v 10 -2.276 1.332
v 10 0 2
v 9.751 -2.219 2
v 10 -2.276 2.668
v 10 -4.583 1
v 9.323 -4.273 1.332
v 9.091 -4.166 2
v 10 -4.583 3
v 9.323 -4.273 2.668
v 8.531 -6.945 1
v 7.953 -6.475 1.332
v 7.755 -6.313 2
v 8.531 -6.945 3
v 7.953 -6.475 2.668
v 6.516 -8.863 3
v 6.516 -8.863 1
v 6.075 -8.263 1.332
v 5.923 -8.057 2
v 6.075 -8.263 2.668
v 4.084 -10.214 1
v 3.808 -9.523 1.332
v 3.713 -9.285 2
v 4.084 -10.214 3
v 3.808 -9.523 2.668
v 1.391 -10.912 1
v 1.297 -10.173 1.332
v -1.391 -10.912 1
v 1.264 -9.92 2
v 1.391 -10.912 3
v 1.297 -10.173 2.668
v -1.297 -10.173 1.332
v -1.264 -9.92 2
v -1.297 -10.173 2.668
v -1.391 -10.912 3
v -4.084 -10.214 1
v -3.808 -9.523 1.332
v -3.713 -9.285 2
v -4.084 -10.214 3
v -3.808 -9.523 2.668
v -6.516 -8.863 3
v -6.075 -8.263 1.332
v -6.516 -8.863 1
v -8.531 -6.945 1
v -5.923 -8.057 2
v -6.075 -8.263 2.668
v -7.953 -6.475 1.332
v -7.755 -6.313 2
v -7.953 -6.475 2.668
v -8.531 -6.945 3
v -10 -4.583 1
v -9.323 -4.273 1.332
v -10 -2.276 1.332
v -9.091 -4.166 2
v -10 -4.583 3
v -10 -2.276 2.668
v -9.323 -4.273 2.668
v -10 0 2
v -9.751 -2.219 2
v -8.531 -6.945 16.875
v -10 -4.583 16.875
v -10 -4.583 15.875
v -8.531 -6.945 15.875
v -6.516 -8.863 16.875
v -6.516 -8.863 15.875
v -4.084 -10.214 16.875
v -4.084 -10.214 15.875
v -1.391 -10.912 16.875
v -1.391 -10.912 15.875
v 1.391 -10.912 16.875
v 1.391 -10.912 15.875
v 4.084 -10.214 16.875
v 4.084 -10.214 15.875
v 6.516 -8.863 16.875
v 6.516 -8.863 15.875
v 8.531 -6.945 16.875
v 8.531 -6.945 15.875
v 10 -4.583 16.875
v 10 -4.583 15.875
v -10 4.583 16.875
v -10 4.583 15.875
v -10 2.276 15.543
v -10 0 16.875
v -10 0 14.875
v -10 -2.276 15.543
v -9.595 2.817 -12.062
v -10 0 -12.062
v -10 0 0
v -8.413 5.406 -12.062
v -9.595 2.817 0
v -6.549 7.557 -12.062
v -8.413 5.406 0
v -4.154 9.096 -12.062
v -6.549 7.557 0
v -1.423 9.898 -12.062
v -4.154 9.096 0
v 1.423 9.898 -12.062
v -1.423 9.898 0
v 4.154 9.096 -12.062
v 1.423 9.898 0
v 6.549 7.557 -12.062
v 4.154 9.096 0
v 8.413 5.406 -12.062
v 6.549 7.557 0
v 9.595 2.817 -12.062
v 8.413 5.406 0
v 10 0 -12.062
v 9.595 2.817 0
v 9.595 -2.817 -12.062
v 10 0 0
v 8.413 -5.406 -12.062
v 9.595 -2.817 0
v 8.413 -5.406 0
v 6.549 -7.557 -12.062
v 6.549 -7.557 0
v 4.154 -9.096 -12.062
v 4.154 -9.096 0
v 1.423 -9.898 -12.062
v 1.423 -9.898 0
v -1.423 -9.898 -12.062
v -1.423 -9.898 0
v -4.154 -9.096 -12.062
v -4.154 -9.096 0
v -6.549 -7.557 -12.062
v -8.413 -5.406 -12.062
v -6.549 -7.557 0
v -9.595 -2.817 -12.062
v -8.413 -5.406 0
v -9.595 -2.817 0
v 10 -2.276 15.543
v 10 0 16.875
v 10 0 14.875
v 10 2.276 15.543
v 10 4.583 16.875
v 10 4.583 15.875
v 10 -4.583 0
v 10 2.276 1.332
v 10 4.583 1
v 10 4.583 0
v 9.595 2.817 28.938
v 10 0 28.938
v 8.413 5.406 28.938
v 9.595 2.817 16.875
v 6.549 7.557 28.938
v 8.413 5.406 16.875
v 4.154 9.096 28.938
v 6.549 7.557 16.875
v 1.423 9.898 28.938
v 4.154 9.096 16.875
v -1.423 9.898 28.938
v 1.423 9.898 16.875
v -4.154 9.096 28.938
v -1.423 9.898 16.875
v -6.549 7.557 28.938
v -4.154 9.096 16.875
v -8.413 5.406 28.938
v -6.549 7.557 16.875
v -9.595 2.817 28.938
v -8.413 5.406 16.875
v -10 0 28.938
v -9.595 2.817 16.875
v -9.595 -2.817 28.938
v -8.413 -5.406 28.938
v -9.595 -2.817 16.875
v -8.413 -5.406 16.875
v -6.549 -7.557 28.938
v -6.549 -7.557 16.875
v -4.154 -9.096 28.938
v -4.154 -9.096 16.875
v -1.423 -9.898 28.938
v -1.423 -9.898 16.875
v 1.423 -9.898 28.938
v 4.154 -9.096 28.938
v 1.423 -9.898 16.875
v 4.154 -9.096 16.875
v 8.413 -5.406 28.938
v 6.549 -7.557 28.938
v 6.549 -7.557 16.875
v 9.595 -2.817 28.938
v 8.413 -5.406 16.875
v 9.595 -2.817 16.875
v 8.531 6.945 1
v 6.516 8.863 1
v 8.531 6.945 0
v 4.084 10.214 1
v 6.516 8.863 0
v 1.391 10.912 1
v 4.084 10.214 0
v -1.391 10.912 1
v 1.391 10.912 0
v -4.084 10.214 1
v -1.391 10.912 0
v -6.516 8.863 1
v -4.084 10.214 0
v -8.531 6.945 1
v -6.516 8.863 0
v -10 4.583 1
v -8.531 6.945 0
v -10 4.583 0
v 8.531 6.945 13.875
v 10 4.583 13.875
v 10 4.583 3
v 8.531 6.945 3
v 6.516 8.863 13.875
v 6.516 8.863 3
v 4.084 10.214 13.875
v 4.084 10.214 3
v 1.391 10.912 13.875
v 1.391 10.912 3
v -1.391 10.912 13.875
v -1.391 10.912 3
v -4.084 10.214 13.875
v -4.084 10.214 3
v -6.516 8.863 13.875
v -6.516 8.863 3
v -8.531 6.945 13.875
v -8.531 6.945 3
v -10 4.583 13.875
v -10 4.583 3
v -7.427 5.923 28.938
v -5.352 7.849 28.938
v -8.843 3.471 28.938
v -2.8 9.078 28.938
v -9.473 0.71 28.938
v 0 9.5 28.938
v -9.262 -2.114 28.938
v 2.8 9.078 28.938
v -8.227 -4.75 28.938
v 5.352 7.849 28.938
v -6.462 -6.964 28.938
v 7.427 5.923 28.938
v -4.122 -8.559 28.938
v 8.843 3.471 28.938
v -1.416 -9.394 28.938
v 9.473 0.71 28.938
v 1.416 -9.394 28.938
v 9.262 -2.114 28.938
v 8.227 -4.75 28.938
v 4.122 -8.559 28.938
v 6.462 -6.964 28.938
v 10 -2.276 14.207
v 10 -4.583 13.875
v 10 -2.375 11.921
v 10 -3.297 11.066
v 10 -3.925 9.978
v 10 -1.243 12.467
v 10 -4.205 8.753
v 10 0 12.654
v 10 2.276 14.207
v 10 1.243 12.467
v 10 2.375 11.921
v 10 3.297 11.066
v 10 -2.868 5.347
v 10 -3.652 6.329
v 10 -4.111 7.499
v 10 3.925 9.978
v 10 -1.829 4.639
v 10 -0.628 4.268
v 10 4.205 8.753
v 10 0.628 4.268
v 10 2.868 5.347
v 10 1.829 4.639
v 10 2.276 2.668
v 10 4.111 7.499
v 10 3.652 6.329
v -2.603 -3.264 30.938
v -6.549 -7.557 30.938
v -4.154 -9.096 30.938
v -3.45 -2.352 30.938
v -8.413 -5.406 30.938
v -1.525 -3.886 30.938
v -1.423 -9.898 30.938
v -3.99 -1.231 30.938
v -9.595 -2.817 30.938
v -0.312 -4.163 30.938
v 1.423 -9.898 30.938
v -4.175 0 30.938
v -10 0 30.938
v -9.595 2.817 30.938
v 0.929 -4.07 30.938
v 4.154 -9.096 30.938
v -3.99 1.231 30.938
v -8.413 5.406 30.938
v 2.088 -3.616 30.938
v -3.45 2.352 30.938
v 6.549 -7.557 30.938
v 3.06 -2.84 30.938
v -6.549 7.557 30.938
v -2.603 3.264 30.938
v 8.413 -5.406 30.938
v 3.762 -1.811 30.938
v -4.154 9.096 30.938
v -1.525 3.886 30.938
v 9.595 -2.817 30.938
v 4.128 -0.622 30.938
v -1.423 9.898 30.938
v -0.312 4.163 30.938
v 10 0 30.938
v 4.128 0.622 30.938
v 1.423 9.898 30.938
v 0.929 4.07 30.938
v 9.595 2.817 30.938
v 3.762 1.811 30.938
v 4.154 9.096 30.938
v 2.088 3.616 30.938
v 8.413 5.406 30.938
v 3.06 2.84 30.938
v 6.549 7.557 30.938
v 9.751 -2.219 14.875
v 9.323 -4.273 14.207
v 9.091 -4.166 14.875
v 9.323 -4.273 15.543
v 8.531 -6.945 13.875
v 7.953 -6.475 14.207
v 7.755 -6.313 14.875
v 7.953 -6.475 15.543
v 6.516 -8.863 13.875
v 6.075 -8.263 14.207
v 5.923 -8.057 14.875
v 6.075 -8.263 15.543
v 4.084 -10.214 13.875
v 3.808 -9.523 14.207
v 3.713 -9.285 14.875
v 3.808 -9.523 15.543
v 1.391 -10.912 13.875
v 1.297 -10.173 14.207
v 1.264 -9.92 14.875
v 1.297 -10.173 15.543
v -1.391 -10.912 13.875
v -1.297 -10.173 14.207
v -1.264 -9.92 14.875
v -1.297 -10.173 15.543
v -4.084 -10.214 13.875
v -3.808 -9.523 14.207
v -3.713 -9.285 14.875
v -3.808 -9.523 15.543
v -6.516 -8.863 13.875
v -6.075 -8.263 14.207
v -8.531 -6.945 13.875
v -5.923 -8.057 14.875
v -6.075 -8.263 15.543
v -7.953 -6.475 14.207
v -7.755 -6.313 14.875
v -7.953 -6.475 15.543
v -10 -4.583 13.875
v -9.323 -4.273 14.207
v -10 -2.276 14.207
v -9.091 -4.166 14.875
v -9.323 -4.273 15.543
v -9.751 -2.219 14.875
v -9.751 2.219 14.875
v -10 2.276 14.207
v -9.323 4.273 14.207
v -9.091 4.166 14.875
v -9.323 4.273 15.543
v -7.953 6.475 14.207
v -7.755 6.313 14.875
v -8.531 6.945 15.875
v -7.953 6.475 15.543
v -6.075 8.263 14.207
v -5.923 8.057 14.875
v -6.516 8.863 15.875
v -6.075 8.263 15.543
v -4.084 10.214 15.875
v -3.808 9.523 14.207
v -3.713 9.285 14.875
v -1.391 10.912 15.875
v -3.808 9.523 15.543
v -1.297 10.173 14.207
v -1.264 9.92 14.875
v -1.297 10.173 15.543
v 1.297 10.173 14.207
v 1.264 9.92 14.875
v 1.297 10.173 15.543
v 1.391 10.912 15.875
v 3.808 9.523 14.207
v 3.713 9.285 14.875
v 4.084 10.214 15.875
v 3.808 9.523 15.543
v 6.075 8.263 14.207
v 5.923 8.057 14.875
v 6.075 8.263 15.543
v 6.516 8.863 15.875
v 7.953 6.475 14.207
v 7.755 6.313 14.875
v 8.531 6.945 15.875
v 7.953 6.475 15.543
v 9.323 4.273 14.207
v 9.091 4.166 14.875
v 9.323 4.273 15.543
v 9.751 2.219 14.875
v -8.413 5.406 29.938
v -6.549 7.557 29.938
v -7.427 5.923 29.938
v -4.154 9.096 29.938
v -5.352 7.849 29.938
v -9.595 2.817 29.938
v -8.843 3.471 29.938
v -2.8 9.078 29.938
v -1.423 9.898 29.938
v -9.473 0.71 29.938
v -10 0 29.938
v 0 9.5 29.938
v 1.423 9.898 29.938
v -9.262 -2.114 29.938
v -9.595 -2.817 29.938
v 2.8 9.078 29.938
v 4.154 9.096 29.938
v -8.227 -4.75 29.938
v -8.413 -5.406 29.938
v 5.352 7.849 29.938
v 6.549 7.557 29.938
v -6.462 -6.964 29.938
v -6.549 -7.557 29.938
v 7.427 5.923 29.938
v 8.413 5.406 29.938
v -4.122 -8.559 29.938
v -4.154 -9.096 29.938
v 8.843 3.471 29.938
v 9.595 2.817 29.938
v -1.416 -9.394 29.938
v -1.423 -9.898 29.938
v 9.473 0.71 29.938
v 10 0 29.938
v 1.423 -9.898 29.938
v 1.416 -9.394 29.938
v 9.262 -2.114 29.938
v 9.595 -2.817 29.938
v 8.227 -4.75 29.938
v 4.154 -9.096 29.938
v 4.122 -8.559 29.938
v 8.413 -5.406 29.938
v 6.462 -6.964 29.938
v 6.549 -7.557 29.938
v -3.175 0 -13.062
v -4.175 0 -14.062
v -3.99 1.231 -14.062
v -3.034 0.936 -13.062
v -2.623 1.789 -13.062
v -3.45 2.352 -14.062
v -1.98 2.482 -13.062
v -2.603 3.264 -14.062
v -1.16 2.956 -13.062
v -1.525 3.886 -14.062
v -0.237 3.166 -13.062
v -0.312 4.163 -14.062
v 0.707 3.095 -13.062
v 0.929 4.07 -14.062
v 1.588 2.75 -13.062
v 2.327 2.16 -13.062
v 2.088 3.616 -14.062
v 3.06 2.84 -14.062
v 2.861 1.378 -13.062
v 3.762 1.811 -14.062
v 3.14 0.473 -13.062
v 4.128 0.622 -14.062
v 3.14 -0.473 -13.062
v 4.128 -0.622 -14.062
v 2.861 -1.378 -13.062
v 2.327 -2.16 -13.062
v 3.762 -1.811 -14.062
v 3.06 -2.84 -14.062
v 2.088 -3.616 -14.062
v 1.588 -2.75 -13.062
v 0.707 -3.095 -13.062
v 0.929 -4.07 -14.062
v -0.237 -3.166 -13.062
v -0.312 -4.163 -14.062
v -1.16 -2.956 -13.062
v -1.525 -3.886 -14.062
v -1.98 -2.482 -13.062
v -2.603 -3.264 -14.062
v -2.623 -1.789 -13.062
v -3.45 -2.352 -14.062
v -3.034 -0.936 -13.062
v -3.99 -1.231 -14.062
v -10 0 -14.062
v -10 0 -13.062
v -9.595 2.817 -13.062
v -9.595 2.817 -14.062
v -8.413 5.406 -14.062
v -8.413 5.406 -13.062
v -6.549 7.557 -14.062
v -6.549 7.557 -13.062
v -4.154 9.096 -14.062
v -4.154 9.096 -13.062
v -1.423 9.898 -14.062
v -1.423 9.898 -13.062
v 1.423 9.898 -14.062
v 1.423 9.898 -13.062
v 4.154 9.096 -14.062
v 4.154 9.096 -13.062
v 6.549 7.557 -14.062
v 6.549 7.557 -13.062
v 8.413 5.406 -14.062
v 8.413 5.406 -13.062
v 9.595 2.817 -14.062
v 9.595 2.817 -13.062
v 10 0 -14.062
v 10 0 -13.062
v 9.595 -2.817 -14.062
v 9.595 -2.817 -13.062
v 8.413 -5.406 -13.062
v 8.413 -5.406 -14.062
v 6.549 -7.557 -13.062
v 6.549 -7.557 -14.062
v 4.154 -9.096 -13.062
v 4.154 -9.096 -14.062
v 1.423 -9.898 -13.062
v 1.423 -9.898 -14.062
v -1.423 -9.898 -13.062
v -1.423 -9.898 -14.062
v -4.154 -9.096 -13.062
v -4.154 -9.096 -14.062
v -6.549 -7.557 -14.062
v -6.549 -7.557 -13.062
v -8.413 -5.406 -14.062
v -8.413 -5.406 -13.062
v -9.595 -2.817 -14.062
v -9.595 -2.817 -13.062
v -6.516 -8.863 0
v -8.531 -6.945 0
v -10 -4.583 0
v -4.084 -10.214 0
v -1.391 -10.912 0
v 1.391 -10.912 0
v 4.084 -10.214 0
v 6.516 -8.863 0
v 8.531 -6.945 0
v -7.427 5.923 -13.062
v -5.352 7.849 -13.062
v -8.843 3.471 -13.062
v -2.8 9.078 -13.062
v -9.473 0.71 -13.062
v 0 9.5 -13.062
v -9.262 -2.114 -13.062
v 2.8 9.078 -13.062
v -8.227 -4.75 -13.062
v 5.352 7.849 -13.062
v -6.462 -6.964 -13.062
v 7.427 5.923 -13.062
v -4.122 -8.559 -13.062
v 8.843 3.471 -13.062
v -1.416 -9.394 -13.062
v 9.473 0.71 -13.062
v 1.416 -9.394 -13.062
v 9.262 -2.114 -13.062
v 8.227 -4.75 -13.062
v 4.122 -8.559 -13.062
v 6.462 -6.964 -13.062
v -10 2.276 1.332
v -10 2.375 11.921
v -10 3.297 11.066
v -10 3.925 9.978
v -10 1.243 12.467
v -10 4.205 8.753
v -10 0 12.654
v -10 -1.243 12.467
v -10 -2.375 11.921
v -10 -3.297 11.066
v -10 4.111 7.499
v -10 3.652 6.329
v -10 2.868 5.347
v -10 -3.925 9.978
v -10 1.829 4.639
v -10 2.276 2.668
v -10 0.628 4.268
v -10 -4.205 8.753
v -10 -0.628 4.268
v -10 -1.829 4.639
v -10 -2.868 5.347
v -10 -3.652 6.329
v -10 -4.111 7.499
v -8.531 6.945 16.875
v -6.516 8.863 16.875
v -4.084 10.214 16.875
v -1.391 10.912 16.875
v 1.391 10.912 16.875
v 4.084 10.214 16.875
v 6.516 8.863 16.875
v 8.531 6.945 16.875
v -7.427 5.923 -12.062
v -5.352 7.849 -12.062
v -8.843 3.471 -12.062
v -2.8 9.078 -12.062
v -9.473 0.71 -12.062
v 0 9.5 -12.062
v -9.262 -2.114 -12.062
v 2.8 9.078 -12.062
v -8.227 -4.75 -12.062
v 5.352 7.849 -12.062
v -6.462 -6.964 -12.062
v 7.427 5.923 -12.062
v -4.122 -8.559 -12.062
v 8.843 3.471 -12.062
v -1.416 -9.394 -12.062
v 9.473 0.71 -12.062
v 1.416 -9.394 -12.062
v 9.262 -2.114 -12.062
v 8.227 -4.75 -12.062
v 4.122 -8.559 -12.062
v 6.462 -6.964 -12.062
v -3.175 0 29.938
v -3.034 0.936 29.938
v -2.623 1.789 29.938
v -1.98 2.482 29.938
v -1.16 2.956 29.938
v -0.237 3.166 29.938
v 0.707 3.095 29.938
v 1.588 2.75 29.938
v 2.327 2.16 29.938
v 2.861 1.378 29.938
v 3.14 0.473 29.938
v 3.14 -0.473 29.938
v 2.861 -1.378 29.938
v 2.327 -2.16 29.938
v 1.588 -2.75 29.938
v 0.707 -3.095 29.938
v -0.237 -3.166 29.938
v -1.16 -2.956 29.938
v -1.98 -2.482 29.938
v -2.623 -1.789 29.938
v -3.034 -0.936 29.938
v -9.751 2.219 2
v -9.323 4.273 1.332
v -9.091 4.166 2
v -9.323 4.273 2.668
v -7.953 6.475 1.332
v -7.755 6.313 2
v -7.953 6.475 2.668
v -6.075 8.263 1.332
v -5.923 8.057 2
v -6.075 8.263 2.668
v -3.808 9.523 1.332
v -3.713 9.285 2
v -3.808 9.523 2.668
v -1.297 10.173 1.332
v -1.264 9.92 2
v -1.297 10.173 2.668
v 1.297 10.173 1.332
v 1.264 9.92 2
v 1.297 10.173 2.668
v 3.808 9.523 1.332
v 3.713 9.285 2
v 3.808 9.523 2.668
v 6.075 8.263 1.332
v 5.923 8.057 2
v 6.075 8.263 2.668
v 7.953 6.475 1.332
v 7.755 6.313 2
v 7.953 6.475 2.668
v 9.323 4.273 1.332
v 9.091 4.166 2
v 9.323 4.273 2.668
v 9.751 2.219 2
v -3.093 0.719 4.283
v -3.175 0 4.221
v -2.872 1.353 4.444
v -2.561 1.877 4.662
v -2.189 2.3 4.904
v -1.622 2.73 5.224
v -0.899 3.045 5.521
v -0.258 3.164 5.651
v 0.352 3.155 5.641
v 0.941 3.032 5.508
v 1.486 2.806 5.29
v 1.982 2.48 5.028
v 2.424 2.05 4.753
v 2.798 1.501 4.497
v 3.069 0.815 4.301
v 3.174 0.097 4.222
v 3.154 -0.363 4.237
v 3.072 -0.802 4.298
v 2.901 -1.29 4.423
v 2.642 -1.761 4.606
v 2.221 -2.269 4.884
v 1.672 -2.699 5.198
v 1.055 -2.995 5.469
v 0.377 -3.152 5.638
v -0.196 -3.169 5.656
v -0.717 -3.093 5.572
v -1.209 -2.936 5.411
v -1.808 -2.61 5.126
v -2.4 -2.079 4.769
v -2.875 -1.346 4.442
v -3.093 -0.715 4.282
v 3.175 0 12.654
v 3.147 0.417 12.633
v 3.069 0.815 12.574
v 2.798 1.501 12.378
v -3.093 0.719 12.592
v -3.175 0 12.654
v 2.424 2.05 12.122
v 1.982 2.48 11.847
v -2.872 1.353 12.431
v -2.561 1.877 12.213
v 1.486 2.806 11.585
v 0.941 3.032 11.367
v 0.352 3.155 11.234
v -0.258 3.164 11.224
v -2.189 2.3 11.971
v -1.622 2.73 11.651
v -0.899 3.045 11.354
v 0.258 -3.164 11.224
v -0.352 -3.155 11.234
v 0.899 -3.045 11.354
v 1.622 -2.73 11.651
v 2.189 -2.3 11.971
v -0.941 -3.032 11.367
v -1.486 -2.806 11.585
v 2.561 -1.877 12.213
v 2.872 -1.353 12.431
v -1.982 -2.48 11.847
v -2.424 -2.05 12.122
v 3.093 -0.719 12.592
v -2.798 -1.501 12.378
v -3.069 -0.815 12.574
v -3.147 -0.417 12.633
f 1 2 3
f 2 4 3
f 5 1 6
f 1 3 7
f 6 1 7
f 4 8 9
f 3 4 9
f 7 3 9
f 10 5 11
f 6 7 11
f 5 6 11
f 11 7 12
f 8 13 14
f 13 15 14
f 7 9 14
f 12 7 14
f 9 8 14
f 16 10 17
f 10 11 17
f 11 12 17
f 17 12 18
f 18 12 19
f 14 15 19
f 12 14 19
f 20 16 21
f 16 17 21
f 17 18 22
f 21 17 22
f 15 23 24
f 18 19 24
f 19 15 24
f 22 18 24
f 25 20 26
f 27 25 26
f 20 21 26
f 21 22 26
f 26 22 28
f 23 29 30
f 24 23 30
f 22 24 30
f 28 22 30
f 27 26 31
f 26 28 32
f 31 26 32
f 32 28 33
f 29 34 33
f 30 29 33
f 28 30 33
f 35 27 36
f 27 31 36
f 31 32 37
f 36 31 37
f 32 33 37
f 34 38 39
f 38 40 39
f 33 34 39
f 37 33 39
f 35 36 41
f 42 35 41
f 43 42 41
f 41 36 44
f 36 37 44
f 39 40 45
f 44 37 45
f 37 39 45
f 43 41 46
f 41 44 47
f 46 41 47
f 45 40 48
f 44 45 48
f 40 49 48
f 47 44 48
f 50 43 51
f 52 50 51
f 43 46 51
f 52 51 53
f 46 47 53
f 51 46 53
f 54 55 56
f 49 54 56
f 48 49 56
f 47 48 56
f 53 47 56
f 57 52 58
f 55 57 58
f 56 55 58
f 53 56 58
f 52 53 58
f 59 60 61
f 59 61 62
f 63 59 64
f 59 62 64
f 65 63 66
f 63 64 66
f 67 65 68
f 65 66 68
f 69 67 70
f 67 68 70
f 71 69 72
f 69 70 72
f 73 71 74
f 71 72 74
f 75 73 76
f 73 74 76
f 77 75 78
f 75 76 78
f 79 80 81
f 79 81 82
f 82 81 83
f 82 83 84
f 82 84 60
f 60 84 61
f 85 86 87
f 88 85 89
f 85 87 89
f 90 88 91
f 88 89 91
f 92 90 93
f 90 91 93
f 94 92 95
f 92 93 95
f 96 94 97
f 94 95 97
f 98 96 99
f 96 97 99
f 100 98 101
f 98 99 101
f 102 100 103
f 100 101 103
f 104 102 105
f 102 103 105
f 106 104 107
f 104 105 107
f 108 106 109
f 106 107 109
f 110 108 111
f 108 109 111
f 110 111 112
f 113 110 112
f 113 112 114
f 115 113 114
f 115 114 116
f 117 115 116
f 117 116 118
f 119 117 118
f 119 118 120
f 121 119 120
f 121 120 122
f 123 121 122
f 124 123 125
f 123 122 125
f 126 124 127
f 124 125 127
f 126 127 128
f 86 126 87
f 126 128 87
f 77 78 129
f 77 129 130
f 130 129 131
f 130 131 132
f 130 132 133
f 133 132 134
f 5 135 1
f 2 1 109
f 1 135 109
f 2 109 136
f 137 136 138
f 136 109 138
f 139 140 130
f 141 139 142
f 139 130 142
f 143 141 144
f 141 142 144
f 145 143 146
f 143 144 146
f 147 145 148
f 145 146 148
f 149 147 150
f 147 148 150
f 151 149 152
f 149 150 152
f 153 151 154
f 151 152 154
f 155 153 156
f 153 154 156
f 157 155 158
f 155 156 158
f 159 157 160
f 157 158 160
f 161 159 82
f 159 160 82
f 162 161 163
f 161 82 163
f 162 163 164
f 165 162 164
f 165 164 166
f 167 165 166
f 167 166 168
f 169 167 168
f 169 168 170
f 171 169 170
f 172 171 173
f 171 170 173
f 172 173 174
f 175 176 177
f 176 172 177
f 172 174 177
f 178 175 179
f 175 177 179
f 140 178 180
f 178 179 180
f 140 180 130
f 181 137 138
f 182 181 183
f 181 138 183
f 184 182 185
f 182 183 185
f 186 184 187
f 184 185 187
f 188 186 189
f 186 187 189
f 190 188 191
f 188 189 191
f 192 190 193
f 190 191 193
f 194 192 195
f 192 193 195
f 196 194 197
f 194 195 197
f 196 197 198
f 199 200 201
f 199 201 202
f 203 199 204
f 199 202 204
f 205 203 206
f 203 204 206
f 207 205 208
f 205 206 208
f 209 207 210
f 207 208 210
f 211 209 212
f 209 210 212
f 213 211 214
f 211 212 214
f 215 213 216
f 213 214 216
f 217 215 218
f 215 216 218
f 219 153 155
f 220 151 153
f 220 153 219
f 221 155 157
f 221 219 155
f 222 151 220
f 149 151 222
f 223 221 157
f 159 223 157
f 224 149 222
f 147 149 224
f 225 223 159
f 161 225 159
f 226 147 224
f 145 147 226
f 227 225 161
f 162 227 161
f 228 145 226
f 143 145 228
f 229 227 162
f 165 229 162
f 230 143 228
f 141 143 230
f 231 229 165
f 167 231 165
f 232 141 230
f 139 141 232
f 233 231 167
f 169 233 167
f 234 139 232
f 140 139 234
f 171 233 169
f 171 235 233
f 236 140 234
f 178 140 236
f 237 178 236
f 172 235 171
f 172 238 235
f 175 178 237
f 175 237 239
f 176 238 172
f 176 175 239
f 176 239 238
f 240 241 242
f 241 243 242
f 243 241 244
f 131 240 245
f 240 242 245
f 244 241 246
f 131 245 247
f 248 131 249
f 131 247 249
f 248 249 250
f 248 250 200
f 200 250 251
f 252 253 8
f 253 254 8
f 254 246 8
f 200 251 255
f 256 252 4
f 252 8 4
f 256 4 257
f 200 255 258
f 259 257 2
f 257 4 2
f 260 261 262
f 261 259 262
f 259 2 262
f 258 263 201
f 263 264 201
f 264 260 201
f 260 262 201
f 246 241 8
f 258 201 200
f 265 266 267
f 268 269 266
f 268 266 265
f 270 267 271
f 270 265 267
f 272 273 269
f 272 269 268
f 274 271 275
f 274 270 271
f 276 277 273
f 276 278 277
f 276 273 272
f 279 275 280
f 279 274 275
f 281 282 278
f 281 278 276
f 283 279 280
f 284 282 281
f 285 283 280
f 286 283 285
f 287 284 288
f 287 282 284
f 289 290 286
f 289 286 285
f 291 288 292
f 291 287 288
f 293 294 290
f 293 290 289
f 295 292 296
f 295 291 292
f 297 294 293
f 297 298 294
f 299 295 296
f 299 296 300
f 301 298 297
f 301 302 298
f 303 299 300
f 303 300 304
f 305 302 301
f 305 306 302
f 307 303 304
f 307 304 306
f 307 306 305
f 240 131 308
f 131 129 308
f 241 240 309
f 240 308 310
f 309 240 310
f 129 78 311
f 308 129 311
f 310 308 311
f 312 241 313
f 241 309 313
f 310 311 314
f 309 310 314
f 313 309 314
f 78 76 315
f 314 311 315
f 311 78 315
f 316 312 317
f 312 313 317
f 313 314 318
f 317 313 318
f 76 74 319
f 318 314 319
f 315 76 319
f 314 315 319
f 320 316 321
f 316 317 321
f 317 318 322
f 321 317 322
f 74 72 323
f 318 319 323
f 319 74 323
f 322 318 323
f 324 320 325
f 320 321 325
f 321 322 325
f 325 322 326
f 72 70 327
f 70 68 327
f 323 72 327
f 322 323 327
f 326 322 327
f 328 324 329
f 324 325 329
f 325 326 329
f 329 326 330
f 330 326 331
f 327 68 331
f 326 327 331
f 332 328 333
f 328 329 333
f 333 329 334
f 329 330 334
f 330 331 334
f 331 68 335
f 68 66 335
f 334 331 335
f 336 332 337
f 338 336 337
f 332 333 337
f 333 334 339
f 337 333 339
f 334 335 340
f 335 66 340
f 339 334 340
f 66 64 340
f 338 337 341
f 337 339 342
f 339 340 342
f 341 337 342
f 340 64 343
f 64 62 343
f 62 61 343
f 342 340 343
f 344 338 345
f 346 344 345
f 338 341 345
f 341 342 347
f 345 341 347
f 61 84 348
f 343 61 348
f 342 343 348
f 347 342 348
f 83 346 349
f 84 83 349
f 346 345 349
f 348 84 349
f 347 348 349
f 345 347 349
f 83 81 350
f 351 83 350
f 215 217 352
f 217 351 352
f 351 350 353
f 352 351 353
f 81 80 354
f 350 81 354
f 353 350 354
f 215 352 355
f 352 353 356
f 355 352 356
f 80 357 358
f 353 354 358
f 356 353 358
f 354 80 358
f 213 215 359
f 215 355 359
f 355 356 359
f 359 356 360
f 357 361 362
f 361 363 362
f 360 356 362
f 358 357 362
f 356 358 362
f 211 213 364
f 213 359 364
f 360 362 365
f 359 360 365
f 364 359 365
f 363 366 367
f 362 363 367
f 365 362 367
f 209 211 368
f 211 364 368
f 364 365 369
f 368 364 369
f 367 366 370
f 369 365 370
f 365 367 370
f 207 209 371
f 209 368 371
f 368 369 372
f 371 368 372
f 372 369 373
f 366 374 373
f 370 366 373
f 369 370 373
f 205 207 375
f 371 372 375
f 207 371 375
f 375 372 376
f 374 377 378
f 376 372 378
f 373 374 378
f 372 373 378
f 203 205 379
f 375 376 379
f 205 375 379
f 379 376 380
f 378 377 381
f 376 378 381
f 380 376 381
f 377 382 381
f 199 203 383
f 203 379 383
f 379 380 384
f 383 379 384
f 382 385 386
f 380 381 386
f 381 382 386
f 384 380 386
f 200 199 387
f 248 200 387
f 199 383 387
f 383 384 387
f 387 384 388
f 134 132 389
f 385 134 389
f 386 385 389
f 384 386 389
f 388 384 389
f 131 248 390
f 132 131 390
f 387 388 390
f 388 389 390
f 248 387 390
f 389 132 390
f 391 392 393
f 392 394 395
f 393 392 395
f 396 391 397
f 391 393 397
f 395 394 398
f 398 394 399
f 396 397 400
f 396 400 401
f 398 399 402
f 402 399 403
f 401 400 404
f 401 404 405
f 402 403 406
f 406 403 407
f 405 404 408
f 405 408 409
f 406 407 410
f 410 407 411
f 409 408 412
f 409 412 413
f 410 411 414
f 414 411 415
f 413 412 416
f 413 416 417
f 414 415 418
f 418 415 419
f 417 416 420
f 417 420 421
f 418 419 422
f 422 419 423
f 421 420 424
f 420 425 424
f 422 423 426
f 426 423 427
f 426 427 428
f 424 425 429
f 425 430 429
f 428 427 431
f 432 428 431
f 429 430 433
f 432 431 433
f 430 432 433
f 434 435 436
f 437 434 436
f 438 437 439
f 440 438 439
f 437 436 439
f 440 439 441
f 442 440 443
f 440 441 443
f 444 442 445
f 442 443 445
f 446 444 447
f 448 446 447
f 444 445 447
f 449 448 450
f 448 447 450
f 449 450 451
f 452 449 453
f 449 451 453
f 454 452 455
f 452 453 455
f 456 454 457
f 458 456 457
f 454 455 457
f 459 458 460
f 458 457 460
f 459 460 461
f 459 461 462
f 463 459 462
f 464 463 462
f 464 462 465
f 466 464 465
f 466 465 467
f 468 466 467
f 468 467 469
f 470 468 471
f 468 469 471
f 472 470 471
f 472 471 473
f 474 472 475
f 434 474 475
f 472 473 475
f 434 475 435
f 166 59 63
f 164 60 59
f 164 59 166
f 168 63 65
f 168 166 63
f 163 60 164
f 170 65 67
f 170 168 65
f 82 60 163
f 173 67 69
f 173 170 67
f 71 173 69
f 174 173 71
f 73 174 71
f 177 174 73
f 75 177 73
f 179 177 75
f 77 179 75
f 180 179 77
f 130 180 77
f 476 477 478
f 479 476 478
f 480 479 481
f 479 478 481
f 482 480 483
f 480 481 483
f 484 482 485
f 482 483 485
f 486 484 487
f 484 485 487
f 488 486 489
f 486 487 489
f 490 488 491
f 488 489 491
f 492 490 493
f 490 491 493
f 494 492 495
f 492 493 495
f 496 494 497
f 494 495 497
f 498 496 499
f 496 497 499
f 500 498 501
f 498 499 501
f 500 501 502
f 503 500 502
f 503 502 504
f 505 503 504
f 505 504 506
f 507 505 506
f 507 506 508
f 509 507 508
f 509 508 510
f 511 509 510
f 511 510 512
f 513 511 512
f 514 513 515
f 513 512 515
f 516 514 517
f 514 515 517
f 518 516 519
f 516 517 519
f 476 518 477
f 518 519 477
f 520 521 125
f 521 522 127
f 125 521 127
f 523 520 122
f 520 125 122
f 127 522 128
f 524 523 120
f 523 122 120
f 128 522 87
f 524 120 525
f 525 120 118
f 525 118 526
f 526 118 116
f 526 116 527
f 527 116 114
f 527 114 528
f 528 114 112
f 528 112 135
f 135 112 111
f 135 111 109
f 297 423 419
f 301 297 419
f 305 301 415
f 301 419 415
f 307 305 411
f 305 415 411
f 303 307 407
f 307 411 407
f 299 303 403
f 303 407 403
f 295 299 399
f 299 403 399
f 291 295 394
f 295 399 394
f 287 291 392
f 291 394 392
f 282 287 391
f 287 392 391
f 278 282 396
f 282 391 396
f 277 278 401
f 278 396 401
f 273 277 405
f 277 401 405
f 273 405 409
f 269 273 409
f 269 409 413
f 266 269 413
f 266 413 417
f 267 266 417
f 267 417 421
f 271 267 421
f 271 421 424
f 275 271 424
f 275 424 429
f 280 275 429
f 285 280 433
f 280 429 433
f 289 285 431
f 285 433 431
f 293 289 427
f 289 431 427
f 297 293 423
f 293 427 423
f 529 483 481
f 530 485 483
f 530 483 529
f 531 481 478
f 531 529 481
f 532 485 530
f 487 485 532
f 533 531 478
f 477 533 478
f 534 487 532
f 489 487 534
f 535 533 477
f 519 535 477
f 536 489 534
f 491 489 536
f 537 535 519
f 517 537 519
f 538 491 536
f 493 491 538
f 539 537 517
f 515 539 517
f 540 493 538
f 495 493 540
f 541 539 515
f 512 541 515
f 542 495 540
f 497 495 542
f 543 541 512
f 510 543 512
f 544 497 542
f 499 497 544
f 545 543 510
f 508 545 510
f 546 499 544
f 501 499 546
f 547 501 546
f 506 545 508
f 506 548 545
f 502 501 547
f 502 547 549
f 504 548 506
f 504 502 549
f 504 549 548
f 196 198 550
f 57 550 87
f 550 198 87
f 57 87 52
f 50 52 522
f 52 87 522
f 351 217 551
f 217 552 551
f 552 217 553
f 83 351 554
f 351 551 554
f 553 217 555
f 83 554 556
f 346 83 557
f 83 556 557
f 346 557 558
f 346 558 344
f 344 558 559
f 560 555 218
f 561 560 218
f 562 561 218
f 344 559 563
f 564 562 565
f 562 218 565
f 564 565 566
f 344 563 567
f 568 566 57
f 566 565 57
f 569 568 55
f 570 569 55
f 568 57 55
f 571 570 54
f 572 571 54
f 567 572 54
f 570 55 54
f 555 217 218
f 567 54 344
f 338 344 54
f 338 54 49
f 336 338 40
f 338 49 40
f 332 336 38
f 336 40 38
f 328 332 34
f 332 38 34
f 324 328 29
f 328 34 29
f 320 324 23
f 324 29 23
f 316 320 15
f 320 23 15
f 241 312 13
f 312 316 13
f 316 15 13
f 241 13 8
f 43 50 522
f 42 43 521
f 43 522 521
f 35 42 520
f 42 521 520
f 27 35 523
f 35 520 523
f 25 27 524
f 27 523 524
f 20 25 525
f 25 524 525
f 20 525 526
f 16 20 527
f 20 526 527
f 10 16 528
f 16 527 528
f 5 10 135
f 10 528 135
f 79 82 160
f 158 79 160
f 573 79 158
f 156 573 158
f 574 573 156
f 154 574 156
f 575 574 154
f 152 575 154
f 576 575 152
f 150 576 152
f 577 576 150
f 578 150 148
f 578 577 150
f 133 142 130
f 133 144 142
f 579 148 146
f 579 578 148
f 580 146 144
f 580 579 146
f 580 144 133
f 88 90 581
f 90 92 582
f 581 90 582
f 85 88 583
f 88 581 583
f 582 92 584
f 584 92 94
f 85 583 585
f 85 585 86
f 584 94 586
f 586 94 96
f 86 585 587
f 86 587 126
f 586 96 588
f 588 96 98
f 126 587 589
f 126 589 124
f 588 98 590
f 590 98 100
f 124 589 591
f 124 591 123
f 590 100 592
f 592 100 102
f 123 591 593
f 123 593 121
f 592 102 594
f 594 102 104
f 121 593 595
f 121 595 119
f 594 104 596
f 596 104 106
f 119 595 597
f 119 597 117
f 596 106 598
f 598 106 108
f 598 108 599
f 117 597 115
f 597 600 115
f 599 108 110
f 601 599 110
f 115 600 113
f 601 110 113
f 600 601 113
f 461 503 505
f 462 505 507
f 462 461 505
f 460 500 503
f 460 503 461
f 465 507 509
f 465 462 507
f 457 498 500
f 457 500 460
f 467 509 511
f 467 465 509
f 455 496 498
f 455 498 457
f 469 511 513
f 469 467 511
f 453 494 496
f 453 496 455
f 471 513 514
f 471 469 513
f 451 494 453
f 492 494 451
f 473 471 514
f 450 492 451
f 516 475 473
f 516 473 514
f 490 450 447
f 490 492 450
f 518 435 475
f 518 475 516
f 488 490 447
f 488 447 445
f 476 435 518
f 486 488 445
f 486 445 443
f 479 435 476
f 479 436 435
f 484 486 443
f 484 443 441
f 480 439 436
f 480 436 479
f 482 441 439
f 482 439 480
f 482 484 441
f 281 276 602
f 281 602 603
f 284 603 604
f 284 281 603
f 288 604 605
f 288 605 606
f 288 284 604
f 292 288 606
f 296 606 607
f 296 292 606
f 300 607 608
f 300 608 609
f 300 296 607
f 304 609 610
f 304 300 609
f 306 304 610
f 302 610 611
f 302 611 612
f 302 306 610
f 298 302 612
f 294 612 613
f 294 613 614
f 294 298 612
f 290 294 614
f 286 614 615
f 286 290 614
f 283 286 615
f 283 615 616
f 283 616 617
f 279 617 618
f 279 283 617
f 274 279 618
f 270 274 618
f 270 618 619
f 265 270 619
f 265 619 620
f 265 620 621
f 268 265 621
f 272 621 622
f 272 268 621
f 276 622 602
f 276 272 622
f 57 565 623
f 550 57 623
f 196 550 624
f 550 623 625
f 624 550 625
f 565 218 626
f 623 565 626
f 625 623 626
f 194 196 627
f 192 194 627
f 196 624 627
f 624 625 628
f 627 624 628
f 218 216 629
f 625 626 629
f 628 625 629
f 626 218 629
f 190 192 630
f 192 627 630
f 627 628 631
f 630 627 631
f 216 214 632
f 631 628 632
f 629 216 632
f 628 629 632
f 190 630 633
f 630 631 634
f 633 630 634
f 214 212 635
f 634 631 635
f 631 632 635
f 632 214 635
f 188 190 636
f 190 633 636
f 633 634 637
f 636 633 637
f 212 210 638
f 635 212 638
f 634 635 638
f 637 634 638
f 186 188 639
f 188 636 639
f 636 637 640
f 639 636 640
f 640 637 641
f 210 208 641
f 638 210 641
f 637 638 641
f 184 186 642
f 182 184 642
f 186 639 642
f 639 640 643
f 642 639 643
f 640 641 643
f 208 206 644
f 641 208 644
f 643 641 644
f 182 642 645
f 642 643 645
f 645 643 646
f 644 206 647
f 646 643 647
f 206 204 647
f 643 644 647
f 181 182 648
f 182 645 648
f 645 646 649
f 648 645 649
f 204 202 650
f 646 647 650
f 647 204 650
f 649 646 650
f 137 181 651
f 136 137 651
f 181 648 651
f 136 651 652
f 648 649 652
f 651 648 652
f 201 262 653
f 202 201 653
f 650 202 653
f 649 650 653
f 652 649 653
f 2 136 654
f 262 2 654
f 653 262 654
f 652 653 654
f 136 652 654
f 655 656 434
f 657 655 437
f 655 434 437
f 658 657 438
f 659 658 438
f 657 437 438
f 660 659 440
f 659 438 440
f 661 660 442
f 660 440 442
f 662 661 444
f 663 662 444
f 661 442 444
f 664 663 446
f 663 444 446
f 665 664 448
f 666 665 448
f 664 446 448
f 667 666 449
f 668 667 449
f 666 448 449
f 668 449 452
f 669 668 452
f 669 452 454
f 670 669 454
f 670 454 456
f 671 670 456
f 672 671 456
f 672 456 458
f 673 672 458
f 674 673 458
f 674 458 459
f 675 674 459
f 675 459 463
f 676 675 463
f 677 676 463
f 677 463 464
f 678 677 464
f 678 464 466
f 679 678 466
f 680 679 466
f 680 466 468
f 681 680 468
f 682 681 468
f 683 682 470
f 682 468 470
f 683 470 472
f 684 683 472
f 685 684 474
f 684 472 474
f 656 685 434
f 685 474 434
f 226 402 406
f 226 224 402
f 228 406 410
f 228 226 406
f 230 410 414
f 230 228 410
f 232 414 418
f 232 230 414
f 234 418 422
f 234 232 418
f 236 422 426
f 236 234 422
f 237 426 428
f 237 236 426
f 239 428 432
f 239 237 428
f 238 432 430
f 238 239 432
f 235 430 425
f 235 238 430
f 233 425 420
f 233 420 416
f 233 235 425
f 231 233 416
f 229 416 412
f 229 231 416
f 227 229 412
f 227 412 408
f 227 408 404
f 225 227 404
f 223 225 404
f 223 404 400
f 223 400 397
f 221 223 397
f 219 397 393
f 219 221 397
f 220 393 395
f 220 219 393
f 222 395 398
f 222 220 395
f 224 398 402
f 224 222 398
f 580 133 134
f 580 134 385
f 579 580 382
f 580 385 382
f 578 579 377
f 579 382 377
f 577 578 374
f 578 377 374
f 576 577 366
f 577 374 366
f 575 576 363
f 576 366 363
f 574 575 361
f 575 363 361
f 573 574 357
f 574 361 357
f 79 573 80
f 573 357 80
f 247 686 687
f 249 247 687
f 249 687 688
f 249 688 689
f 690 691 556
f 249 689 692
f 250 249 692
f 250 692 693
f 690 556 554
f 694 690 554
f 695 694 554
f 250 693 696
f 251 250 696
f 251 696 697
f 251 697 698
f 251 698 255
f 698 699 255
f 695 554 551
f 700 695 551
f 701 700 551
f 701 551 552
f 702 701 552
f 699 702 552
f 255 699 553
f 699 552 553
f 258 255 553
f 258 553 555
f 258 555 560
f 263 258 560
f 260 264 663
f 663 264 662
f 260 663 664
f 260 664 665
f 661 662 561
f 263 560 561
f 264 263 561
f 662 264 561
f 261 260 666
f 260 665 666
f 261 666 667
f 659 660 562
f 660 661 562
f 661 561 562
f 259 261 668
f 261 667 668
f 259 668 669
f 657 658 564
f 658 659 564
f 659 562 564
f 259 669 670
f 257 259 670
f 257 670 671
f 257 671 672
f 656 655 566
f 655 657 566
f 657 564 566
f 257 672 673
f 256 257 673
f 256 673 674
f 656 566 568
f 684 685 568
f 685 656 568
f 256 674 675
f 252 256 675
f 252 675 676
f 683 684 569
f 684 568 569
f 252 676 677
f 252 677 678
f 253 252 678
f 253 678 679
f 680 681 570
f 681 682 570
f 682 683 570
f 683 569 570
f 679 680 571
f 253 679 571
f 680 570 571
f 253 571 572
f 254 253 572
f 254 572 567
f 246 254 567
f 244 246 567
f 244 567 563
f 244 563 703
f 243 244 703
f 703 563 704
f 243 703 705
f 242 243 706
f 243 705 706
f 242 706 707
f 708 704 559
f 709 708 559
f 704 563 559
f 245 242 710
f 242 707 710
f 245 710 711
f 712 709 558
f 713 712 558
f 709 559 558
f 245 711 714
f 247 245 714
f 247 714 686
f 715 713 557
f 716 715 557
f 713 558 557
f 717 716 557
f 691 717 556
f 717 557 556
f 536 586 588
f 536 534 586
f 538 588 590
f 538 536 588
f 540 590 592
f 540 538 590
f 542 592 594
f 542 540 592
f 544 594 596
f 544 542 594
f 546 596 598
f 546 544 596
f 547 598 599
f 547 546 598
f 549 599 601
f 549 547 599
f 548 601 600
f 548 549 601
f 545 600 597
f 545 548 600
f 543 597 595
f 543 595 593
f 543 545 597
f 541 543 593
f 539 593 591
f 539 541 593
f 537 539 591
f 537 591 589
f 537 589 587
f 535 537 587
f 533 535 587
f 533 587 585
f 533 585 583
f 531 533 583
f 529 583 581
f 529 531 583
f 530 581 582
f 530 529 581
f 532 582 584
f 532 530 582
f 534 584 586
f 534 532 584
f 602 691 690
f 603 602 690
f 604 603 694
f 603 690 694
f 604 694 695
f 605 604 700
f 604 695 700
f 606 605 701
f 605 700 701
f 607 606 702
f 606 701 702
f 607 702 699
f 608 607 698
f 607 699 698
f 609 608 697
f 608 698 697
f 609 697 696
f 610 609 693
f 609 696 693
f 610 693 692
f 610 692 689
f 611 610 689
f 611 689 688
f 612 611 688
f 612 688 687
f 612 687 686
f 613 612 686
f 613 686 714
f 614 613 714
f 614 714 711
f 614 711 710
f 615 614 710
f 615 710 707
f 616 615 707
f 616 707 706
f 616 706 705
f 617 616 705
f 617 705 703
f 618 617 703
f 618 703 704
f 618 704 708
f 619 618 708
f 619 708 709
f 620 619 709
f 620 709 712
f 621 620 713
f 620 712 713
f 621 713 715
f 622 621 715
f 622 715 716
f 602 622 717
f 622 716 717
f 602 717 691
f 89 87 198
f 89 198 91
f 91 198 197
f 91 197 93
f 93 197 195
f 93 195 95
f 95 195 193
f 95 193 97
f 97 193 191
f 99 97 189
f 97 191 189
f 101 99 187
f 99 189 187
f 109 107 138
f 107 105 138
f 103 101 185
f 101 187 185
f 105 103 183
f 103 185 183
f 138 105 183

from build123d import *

# Parameters (mm, degrees)
SKETCH1_R               = 11
BOSS_EXTRUDE1_DEPTH     = 16.875
SKETCH2_R               = 10
BOSS_EXTRUDE2_DEPTH     = 14.0625
SKETCH3_R               = 10
BOSS_EXTRUDE3_DEPTH     = 14.0625
CUT_EXTRUDE4_DEPTH      = 15.0625
CUT_EXTRUDE4_DEPTH_BACK = 31.9375
SKETCH6_W               = 1
SKETCH6_H               = 0.5
F_3_8_24_TAPPED_HOLE1_D = 8.4328
SKETCH10_R              = 3.175
CUT_EXTRUDE5_DEPTH      = 1
CUT_EXTRUDE5_DEPTH_BACK = 46
CHAMFER1_SIZE           = 1


with BuildPart() as part:
    # Sketch1 → Boss-Extrude1 (new body)
    with BuildSketch(Plane.XY):
        Circle(SKETCH1_R)
    extrude(amount=BOSS_EXTRUDE1_DEPTH)

    # Sketch2 → Boss-Extrude2 (add)
    with BuildSketch(Plane(origin=(0, 0, 0), x_dir=(-1, 0, 0), z_dir=(0, 0, -1))):
        Circle(SKETCH2_R)
    extrude(amount=BOSS_EXTRUDE2_DEPTH)

    # Sketch3 → Boss-Extrude3 (add)
    with BuildSketch(Plane.XY.offset(16.875)):
        Circle(SKETCH3_R)
    extrude(amount=BOSS_EXTRUDE3_DEPTH)

    # Sketch5 → Cut-Extrude4 (cut, two sides)
    with BuildSketch(Plane(origin=(0, 0, 0), x_dir=(-1, 0, 0), z_dir=(0, 0, -1))) as cut_extrude4_sk:
        with BuildLine():
            Line((-10, -4.582575695), (-10, 4.582575695))
            ThreePointArc((-10, 4.582575695), (-11, 0), (-10, -4.582575695))
        make_face()
        with BuildLine():
            ThreePointArc((11, 0), (10.74709263, 2.34520788), (10, 4.582575695))
            Line((10, 4.582575695), (10, -4.582575695))
            ThreePointArc((10, -4.582575695), (10.74709263, -2.34520788), (11, 0))
        make_face()
    extrude(amount=CUT_EXTRUDE4_DEPTH, mode=Mode.SUBTRACT)
    extrude(cut_extrude4_sk.sketch, amount=-CUT_EXTRUDE4_DEPTH_BACK, mode=Mode.SUBTRACT)

    # Sketch6 → Cut-Revolve1 (revolve, cut)
    with BuildSketch(Plane(origin=(0, 0, 0), x_dir=(0, 0, -1), z_dir=(1, 0, 0))):
        with Locations((12.5625, 9.75)):
            Rectangle(SKETCH6_W, SKETCH6_H)
        with BuildLine():
            Line((-15.875, 11), (-13.875, 11))
            ThreePointArc((-13.875, 11), (-14.875, 10), (-15.875, 11))
        make_face()
        with Locations((-29.4375, 9.75)):
            Rectangle(SKETCH6_W, SKETCH6_H)
        with BuildLine():
            Line((-3, 11), (-1, 11))
            ThreePointArc((-1, 11), (-2, 10), (-3, 11))
        make_face()
    revolve(axis=Axis((0, 0, 30.9375), (0, 0, -1)), mode=Mode.SUBTRACT)

    # 3/8-24 Tapped Hole1 (through all)
    with Locations(Plane(origin=(10, 0, 0), x_dir=(0, 0, -1), z_dir=(1, 0, 0))):
        with Locations((-8.4375, 0)):
            Hole(F_3_8_24_TAPPED_HOLE1_D / 2)

    # Sketch10 → Cut-Extrude5 (cut, two sides)
    with BuildSketch(Plane(origin=(0, 0, -14.0625), x_dir=(-1, 0, 0), z_dir=(0, 0, -1))) as cut_extrude5_sk:
        Circle(SKETCH10_R)
    extrude(amount=CUT_EXTRUDE5_DEPTH, mode=Mode.SUBTRACT)
    extrude(cut_extrude5_sk.sketch, amount=-CUT_EXTRUDE5_DEPTH_BACK, mode=Mode.SUBTRACT)

    # Chamfer1
    chamfer1_edges = [part.edges().sort_by_distance(p)[0] for p in [
        (3.175, 0, -14.0625),
        (3.175, 0, 30.9375),
    ]]
    chamfer(chamfer1_edges, length=CHAMFER1_SIZE)


solid = part.part
